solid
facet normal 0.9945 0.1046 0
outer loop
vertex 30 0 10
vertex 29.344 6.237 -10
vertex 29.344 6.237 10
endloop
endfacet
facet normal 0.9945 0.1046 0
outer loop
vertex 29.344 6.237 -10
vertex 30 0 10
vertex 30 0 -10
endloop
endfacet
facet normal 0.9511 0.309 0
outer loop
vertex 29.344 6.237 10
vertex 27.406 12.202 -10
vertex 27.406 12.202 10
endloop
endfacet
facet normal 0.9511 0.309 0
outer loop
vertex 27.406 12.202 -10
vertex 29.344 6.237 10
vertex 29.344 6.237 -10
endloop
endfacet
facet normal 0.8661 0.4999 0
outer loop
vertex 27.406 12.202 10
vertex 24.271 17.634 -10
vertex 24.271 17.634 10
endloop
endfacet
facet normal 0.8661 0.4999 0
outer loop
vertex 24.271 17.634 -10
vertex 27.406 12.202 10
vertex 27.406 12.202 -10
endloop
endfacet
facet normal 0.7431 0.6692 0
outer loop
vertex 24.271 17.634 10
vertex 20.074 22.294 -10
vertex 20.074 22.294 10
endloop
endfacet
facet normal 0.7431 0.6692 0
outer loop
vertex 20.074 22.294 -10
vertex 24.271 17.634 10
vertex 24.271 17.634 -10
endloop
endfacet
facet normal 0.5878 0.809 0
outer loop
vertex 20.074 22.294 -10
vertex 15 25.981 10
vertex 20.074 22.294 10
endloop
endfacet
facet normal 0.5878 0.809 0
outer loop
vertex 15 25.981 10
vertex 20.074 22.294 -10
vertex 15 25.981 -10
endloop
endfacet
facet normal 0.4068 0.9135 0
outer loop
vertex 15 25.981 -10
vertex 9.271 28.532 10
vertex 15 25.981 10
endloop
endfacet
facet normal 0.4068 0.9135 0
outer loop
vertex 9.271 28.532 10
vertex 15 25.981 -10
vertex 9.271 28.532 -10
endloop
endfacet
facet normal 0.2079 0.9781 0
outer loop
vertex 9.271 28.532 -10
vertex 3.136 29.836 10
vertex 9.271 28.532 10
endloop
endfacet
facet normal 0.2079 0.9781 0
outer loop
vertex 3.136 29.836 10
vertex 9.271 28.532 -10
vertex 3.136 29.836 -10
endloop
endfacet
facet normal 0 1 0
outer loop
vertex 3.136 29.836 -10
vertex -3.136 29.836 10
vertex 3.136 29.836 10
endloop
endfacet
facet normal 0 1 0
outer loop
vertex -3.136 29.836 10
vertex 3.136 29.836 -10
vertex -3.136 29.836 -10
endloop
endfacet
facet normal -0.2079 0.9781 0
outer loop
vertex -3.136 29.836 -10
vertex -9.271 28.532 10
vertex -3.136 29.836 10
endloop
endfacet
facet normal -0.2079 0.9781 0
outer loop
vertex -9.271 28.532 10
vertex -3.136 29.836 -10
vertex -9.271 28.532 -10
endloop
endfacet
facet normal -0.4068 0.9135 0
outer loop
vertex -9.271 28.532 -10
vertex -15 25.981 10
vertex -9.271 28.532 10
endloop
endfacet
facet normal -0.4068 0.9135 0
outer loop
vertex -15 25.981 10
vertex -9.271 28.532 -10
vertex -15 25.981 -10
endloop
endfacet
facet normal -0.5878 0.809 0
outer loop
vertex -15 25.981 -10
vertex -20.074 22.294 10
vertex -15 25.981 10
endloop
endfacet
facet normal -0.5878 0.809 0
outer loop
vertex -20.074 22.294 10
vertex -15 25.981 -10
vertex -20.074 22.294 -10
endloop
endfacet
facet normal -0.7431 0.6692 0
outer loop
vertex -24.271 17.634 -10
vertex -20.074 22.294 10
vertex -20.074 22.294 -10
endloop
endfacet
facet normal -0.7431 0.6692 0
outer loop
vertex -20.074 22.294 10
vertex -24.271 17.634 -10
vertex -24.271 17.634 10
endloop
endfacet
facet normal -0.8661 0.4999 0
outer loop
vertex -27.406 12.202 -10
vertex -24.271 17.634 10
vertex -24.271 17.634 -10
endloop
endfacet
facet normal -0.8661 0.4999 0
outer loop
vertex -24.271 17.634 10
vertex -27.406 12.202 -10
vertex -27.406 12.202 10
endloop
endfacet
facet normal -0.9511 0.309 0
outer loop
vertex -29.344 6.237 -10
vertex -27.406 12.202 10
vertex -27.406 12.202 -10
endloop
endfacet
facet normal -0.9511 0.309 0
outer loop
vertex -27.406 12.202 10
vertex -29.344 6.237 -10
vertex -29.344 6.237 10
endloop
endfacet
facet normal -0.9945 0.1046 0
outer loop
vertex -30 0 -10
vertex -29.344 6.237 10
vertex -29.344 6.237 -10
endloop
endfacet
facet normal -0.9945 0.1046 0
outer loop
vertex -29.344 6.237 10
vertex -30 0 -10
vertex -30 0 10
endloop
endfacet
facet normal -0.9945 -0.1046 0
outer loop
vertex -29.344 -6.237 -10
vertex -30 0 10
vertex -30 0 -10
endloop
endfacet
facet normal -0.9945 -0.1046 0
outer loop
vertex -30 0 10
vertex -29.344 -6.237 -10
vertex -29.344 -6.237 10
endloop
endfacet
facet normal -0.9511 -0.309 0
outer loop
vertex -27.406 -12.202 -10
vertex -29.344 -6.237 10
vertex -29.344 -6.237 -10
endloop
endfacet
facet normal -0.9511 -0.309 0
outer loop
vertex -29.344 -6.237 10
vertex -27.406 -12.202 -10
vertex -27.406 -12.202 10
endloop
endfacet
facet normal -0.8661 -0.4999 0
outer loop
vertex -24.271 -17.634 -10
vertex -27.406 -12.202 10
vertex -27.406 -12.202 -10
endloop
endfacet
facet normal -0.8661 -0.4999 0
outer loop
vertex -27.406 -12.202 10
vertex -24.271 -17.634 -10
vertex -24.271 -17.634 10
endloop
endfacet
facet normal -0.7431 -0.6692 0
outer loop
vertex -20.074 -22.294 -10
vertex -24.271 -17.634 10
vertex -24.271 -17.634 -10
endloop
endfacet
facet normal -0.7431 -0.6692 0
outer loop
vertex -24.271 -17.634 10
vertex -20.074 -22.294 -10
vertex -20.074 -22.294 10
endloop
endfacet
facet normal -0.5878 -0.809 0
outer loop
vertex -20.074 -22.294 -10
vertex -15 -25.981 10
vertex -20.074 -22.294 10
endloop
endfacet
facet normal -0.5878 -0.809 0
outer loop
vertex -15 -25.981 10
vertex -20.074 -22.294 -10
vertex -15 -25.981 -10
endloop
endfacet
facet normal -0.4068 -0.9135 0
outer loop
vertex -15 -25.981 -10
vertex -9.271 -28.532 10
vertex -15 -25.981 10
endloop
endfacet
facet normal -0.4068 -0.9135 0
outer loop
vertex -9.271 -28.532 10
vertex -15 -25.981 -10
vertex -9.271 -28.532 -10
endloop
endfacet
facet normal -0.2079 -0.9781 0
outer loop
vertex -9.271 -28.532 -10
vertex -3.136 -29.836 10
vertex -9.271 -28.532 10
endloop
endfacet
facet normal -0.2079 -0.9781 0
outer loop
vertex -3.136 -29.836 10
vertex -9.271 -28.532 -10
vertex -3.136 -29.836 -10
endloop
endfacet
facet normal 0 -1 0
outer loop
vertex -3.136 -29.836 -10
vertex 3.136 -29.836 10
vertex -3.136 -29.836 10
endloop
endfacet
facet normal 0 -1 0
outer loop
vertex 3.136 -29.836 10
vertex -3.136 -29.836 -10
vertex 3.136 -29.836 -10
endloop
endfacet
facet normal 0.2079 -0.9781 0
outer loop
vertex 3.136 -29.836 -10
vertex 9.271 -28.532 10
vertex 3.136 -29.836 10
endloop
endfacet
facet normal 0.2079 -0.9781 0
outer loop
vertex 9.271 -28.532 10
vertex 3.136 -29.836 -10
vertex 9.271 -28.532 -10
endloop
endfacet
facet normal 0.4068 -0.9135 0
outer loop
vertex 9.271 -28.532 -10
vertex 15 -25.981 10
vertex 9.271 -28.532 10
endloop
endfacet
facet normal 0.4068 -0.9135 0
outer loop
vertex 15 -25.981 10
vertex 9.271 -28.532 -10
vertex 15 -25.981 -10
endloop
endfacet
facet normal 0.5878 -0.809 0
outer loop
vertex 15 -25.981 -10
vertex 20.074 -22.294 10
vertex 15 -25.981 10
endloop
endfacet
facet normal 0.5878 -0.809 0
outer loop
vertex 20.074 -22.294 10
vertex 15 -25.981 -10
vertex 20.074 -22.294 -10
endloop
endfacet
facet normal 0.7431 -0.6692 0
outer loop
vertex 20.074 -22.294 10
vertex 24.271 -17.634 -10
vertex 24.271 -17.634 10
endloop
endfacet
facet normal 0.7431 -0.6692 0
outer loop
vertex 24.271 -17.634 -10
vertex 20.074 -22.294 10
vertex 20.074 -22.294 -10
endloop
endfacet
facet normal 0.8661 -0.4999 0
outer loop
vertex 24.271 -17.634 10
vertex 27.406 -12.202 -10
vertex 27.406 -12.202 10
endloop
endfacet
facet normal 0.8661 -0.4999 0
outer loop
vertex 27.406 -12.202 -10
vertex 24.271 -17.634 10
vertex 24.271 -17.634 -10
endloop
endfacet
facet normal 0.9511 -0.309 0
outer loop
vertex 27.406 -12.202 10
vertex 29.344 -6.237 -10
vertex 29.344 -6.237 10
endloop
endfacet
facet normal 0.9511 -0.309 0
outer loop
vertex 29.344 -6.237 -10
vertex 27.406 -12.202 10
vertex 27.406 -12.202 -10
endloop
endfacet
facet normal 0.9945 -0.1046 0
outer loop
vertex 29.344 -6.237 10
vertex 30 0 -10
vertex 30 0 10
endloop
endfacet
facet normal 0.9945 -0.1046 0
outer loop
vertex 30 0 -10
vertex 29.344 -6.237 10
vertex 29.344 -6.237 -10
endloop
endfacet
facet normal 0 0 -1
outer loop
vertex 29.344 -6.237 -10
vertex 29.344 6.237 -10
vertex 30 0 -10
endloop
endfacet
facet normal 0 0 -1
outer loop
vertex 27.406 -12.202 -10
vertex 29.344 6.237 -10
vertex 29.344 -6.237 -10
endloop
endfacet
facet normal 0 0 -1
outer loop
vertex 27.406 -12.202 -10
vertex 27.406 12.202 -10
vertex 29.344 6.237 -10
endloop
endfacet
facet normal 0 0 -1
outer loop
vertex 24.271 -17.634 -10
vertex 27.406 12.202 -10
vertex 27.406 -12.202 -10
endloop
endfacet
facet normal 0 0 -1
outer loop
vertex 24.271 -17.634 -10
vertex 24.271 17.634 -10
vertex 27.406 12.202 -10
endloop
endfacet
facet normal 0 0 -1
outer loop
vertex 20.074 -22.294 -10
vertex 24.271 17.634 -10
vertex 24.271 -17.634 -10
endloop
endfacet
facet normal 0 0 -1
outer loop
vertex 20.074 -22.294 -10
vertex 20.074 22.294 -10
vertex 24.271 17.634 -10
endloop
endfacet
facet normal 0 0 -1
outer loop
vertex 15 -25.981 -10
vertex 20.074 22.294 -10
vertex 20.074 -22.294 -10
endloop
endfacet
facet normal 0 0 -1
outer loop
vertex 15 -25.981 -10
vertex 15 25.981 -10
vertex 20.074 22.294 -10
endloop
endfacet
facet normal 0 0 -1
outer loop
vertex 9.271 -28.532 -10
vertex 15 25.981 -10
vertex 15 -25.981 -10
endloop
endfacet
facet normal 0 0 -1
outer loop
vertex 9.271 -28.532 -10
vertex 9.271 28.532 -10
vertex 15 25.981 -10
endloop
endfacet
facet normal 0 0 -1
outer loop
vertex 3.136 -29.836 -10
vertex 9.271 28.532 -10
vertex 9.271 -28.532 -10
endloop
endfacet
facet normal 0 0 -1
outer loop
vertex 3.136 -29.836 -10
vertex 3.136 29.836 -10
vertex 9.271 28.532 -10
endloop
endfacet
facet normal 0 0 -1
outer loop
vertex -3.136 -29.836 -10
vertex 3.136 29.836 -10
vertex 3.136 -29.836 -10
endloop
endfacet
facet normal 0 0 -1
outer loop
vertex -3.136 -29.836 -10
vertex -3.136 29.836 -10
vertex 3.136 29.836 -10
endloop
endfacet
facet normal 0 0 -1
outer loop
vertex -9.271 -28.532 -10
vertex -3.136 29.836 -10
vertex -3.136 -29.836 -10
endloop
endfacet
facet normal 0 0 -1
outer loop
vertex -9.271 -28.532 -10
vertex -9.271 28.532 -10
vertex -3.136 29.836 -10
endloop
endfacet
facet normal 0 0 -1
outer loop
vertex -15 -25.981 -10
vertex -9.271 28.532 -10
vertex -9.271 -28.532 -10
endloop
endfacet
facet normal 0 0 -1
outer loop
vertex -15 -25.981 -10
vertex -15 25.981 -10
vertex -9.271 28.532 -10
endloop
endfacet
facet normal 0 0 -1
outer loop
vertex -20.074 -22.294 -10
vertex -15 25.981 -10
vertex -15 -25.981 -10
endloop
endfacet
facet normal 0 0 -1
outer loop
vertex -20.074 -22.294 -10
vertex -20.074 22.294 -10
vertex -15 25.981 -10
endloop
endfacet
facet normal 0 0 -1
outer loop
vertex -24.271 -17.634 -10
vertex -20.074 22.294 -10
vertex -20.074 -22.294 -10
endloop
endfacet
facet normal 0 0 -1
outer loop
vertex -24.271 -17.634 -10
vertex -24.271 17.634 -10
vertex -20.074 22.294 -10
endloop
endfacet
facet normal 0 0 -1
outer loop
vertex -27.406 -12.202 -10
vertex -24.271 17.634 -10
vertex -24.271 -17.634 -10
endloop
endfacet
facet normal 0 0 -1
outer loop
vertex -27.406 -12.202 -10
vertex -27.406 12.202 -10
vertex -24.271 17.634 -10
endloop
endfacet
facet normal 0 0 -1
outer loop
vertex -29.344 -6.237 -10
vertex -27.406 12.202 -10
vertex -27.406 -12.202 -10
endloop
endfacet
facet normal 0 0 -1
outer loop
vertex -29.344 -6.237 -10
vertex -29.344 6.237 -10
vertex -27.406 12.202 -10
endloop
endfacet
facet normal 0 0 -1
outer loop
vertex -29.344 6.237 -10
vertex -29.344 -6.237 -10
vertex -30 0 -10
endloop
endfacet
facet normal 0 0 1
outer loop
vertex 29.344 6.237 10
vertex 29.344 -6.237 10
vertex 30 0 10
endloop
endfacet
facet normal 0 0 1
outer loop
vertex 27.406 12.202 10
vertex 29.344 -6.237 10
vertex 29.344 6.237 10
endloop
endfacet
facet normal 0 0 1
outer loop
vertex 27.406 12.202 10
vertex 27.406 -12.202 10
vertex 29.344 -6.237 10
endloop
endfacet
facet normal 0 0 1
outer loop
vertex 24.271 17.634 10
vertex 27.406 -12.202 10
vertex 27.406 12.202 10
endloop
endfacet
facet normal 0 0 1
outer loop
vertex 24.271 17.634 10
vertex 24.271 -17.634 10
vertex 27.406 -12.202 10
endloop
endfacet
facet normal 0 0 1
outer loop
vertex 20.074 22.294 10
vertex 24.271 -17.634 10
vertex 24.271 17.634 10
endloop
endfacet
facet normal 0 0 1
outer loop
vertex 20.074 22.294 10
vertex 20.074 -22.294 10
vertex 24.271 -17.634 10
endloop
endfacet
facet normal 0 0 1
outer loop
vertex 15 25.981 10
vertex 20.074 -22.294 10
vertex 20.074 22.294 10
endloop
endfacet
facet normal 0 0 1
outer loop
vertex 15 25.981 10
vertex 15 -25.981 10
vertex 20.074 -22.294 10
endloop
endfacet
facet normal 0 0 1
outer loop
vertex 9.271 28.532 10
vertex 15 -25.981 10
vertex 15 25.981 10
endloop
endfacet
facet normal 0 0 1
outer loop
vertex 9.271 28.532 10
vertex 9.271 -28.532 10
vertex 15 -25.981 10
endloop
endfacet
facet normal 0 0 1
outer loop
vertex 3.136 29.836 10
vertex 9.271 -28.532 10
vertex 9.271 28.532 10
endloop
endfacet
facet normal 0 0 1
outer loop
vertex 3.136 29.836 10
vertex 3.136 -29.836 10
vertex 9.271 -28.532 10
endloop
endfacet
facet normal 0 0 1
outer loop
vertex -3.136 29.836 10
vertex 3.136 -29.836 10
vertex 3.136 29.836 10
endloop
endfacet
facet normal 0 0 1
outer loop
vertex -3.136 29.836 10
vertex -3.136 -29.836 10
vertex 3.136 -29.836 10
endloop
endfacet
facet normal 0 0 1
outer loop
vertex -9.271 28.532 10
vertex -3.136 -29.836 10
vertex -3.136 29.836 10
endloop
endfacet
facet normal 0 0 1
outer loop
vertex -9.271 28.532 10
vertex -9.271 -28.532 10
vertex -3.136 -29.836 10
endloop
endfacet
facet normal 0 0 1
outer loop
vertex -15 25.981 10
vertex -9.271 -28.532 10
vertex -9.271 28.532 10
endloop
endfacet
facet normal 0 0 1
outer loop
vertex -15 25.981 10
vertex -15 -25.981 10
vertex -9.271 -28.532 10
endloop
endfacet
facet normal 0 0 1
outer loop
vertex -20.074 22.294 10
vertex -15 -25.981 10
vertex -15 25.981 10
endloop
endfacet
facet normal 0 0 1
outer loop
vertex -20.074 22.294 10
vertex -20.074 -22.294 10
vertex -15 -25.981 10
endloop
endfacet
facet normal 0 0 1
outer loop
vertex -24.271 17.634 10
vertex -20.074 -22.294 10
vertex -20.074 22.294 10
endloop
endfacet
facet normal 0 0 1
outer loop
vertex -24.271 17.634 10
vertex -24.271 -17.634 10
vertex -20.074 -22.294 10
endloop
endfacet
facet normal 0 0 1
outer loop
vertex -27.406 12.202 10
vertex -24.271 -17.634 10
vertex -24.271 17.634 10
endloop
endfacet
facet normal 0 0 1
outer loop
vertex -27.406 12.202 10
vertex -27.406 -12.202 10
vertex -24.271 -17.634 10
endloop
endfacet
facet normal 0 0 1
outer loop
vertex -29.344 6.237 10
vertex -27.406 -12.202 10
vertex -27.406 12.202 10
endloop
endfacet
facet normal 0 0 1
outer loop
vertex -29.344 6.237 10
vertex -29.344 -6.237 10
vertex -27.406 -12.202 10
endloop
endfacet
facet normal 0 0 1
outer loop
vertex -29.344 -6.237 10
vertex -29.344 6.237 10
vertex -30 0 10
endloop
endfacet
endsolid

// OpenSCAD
cylinder(
        h=20,
        r=30,
        center=true
);
